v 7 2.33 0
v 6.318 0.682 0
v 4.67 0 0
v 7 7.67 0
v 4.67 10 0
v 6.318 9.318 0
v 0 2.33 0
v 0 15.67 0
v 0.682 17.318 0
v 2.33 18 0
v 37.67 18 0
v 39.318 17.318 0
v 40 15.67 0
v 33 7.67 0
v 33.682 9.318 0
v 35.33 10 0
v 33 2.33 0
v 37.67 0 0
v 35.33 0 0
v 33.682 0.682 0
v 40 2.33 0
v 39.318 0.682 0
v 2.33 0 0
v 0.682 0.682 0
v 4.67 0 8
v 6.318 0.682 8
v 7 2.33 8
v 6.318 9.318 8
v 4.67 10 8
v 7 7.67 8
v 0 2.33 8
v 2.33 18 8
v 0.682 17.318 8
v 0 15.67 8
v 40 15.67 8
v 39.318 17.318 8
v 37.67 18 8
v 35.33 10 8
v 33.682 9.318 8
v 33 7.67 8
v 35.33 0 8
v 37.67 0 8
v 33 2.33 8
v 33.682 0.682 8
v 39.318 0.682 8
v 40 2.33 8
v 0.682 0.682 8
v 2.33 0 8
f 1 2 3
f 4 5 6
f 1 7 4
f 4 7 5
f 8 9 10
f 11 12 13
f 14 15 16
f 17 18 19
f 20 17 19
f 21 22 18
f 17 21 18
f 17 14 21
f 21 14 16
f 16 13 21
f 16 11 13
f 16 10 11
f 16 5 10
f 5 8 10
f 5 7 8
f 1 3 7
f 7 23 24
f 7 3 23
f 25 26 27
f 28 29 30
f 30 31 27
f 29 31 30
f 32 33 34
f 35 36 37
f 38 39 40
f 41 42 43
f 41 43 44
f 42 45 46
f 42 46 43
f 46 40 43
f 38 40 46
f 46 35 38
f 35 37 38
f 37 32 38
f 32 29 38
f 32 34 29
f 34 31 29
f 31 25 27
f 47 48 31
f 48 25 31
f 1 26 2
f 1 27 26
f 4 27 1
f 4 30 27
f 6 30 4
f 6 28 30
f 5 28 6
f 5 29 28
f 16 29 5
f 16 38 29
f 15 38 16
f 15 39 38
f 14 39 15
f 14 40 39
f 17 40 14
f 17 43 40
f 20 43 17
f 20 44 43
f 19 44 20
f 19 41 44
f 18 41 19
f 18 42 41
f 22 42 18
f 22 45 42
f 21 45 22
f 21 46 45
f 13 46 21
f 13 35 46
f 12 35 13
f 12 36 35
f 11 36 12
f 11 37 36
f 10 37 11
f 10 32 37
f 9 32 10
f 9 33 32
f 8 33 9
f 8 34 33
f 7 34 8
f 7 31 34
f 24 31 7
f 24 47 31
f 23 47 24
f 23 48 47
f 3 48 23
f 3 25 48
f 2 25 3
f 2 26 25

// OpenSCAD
$fn = 32;

// ----------------------------------------------------------------------
// Clip blank: staple clip, 8 mm thick
// ----------------------------------------------------------------------

// --- parameters (mm) ---
profile_height = 8;       // extrusion height
profile_points = 24;      // points of the closed outline

profile = [[0, 2.33], [0.682, 0.682], [2.33, 0], [4.67, 0], [6.318, 0.682], [7, 2.33], [7, 7.67], [6.318, 9.318], [4.67, 10], [35.33, 10], [33.682, 9.318], [33, 7.67], [33, 2.33], [33.682, 0.682], [35.33, 0], [37.67, 0], [39.318, 0.682], [40, 2.33], [40, 15.67], [39.318, 17.318], [37.67, 18], [2.33, 18], [0.682, 17.318], [0, 15.67]];  // single closed polygon, 24 points, counter clockwise

// --- the one profile operation ---
linear_extrude(height = profile_height) polygon(points = profile);
